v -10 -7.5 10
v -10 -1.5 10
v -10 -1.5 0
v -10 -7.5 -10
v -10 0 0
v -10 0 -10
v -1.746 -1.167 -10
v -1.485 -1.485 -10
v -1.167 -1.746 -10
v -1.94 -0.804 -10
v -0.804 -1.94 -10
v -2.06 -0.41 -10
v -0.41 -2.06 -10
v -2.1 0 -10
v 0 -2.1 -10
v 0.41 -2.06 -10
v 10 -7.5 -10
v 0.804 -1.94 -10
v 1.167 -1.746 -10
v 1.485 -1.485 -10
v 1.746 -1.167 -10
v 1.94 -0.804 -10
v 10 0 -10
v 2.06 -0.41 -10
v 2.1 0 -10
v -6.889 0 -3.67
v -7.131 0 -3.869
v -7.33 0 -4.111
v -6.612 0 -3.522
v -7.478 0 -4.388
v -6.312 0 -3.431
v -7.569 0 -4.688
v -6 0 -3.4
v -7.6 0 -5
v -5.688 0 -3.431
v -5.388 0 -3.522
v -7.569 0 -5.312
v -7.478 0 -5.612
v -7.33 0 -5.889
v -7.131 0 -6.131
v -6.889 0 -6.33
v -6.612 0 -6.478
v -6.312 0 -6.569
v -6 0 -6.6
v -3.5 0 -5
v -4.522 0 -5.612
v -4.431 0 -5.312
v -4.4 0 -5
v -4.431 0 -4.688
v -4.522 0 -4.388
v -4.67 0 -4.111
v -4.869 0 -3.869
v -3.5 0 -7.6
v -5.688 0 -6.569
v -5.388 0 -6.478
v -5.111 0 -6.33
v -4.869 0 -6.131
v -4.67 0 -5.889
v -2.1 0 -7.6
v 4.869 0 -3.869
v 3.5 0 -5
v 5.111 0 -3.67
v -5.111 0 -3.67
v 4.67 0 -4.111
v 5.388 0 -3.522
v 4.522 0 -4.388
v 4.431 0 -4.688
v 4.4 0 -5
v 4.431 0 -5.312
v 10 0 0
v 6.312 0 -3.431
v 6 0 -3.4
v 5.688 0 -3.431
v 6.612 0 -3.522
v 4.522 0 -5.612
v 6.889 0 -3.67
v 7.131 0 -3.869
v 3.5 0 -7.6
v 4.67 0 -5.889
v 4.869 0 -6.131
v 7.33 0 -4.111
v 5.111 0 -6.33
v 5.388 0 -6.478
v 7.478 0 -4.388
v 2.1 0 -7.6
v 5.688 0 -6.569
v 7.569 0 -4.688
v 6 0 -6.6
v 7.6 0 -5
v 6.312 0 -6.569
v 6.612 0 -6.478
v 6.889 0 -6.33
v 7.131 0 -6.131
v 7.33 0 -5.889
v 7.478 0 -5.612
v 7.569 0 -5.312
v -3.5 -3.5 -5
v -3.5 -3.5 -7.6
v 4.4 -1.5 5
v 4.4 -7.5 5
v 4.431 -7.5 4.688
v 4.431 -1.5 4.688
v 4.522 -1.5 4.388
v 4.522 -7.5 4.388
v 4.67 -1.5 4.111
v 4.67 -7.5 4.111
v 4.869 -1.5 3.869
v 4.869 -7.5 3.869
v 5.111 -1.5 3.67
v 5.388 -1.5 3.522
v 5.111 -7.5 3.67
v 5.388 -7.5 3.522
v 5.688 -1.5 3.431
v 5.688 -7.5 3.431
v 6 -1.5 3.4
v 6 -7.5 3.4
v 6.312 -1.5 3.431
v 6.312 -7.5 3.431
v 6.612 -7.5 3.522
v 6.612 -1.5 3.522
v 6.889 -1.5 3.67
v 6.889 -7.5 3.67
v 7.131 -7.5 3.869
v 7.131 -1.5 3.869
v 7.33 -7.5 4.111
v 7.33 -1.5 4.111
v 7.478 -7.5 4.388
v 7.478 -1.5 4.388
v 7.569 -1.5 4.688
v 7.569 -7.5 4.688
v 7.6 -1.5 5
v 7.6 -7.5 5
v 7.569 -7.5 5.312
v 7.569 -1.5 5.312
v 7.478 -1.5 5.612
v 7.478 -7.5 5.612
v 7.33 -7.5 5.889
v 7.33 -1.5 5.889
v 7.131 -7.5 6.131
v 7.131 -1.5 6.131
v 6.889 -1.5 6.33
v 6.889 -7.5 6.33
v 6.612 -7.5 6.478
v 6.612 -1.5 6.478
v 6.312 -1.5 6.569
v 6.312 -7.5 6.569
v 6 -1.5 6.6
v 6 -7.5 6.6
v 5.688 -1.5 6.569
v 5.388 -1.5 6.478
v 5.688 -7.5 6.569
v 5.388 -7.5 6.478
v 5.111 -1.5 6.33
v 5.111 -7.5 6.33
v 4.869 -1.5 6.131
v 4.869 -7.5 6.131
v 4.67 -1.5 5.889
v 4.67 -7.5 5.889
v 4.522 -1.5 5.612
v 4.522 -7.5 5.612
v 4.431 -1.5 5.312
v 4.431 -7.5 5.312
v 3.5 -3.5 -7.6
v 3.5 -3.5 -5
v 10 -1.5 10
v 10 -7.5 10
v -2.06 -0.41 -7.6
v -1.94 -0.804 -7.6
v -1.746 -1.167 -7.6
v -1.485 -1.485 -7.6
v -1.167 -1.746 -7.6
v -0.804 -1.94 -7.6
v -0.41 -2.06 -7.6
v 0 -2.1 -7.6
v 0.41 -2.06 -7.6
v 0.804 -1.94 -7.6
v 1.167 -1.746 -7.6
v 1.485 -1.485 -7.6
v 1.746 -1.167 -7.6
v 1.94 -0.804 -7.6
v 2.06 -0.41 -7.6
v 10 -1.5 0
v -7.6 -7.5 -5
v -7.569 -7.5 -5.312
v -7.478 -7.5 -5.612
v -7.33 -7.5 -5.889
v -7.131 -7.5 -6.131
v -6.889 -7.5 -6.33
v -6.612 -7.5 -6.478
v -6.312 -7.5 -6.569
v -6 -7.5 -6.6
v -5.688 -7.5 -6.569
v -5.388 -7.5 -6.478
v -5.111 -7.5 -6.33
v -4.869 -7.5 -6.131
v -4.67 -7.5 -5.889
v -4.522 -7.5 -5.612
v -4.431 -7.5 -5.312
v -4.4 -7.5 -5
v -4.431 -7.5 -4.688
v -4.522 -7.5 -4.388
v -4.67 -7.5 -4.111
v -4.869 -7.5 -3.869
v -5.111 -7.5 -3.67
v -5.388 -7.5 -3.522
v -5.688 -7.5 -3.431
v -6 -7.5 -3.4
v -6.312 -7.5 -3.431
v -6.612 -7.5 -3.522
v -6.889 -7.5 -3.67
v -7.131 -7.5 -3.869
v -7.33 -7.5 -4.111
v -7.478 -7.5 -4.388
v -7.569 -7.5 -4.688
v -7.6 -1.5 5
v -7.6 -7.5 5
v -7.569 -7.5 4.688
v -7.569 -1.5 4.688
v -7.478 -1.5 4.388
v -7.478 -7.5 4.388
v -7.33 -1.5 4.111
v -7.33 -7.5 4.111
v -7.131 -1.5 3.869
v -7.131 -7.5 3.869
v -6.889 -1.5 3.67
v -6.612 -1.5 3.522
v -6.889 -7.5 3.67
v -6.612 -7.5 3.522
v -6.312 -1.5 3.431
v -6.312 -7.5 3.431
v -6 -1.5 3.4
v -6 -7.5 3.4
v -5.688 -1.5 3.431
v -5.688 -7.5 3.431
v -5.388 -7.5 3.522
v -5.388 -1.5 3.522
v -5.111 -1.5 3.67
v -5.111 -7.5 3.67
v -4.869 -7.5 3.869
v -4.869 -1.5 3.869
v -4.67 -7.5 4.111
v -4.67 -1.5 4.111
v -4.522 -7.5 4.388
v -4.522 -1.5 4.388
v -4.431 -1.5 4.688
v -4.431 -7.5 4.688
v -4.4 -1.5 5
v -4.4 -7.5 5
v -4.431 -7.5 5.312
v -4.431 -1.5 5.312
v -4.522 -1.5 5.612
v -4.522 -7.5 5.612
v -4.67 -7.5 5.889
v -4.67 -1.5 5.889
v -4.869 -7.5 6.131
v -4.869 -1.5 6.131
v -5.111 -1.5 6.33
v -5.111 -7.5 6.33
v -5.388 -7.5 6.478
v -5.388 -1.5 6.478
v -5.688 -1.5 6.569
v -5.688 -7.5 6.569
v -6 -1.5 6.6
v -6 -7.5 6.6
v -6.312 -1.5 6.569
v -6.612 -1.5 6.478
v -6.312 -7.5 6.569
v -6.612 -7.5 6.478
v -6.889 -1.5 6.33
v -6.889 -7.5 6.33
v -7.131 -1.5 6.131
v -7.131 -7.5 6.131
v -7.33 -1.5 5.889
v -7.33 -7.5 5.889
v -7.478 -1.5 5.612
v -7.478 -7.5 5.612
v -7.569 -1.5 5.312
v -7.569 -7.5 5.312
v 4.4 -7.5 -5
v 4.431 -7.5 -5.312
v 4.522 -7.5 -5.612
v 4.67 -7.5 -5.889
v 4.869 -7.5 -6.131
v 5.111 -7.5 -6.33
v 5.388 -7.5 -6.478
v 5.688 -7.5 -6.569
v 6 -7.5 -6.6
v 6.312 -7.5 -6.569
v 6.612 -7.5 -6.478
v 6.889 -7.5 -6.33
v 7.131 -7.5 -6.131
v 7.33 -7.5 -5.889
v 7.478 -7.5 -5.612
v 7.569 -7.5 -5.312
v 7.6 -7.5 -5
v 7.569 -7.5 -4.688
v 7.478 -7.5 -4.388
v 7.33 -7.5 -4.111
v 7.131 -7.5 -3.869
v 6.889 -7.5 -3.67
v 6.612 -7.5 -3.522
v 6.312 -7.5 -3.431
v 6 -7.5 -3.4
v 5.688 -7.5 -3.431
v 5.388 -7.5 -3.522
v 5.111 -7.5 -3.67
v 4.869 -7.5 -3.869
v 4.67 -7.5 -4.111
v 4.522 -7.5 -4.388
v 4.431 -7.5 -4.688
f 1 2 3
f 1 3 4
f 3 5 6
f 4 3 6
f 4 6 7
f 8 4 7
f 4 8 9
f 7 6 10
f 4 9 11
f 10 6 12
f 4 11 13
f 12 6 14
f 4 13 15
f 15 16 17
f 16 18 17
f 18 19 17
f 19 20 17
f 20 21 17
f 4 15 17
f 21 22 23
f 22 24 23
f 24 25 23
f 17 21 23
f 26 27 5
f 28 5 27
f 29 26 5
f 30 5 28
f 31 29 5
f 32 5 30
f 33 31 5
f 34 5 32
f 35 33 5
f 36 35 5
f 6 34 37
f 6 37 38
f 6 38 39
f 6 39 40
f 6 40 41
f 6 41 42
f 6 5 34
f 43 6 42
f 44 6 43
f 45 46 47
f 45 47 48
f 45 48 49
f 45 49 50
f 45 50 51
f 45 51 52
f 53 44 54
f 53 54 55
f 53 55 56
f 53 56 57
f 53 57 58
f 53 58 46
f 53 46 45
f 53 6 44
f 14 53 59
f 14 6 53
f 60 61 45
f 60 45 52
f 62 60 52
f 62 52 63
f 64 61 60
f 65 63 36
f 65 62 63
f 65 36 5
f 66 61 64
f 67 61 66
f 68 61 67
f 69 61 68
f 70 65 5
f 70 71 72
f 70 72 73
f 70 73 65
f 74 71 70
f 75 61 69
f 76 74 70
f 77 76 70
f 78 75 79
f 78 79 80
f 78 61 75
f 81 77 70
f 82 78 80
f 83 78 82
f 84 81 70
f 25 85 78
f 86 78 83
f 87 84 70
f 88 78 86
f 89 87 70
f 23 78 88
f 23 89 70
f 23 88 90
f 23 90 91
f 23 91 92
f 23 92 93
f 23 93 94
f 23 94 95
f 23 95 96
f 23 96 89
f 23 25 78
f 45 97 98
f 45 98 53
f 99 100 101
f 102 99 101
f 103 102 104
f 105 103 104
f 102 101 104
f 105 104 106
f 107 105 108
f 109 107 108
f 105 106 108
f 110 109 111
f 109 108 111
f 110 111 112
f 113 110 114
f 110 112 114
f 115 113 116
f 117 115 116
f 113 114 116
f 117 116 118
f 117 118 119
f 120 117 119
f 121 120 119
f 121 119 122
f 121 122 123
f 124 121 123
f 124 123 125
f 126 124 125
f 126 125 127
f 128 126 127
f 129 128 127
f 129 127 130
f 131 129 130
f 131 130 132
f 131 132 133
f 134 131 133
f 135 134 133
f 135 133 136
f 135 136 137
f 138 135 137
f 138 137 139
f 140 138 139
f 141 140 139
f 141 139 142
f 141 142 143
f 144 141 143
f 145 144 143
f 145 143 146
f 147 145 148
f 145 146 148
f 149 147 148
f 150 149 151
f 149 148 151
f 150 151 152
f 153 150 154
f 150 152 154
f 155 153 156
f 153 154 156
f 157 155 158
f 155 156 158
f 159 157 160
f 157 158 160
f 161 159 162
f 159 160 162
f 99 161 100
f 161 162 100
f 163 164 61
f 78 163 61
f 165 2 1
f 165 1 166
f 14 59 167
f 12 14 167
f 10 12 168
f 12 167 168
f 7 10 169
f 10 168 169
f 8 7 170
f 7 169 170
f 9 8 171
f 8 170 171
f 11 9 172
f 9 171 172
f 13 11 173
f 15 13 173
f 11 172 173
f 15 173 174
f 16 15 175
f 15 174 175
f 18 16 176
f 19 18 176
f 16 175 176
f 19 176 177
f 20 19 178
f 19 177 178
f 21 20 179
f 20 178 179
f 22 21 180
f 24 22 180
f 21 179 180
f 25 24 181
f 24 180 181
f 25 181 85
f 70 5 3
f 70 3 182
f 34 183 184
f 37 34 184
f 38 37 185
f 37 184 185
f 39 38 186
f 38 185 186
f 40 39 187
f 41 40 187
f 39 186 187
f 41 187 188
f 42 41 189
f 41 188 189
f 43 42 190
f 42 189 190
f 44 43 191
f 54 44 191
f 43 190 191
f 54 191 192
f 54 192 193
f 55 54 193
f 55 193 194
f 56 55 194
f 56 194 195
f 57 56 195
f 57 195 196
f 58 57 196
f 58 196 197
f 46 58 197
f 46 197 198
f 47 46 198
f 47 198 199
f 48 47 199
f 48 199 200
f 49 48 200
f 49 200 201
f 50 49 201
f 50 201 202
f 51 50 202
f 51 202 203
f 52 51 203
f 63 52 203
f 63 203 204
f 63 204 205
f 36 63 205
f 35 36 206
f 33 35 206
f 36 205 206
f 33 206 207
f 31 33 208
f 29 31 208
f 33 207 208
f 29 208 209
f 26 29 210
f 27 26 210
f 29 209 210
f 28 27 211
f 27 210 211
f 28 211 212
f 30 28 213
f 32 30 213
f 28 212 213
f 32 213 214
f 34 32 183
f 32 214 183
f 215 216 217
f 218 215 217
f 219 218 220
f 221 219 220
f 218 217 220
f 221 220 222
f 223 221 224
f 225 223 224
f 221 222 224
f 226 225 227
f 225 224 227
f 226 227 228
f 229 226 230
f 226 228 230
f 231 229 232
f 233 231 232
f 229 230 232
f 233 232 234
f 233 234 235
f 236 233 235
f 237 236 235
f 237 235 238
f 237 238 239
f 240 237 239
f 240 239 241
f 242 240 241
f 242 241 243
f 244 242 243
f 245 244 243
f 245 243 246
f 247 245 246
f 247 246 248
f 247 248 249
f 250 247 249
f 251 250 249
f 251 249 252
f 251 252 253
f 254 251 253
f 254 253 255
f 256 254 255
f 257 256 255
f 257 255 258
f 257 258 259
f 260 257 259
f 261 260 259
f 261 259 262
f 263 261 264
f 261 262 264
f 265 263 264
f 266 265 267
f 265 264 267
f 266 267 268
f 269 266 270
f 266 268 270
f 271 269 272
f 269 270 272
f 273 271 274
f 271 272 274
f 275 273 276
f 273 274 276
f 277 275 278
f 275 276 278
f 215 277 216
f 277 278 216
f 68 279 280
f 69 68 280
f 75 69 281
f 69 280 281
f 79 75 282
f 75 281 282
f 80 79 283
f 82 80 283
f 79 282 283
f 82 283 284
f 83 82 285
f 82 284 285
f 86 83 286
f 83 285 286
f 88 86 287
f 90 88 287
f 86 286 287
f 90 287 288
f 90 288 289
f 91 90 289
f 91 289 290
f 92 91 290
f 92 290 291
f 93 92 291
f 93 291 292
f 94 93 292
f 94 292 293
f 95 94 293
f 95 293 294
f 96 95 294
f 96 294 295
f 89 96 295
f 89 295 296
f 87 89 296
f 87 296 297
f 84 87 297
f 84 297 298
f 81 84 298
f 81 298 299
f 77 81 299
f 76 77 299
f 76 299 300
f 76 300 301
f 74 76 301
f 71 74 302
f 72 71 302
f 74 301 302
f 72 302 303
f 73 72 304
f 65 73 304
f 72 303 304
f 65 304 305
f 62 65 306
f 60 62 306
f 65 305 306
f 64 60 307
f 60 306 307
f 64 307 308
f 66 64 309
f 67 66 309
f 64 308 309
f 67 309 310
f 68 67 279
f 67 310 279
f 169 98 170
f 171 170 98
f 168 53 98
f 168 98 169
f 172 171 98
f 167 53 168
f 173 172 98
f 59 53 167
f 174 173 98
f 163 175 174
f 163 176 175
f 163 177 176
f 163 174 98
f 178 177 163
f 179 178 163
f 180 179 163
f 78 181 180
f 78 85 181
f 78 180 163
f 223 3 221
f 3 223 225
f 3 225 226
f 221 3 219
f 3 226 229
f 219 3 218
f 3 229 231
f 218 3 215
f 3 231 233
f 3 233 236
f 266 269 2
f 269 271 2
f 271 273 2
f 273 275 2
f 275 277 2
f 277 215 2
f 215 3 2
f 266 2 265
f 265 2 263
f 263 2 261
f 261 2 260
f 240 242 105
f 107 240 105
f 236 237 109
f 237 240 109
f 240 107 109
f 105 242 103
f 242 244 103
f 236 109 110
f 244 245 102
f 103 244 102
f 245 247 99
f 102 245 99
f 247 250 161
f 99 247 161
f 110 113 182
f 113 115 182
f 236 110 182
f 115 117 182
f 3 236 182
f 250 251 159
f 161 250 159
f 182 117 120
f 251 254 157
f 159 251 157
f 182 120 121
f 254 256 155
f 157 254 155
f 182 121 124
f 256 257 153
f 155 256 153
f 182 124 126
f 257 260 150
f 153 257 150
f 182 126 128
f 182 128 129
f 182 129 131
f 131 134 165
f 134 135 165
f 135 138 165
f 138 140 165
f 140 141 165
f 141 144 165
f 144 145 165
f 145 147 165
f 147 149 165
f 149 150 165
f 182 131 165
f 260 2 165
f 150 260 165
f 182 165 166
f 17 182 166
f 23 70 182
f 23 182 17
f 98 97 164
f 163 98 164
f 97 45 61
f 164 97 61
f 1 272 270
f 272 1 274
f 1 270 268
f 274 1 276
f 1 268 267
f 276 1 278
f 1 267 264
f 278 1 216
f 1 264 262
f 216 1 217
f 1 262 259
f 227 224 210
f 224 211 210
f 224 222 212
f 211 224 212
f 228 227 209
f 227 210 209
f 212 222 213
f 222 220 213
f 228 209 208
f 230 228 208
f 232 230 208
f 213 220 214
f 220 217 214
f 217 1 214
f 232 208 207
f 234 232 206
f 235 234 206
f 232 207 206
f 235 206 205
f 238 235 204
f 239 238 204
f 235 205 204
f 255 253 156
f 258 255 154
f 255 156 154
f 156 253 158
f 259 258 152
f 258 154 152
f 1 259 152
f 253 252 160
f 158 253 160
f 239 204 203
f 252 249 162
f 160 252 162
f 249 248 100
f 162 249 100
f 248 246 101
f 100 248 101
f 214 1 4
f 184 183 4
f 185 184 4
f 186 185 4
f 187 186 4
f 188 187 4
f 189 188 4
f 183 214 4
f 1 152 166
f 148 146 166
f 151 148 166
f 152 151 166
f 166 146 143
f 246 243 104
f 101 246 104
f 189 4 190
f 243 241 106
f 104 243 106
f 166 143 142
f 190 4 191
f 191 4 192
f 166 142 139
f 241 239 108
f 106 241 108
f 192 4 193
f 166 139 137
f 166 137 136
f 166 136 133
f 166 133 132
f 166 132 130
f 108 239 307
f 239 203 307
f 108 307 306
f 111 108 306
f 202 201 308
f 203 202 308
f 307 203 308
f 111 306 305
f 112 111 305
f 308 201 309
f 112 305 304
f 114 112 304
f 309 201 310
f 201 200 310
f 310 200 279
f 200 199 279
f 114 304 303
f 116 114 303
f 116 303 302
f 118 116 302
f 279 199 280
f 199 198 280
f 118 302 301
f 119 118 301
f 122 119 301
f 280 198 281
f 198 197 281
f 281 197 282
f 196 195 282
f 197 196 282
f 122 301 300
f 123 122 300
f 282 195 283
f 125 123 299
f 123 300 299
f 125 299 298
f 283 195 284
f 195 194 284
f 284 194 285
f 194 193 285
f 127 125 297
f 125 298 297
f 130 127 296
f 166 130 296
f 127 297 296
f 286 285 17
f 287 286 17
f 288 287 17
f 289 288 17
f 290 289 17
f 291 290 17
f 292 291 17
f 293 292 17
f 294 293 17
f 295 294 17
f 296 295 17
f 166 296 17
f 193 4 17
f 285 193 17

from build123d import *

# Parameters (mm, degrees)
SKETCH2_W                  = 20
SKETCH2_H                  = 20
BOSS_EXTRUDE1_DEPTH        = 7.5
SKETCH3_W                  = 20
SKETCH3_H                  = 3
CUT_EXTRUDE1_DEPTH         = 10
SKETCH4_W                  = 7
SKETCH4_H                  = 7
CUT_EXTRUDE2_DEPTH         = 2.6
SKETCH5_R                  = 2.1
CUT_EXTRUDE3_DEPTH         = 20.52562419
F_3_1_3_1_DIAMETER_HOLE1_D = 3.2
F_3_1_3_1_DIAMETER_HOLE2_D = 3.2


with BuildPart() as part:
    # Sketch2 → Boss-Extrude1 (new body)
    with BuildSketch(Plane(origin=(0, 0, 0), x_dir=(1, 0, 0), z_dir=(0, 1, 0))):
        Rectangle(SKETCH2_W, SKETCH2_H)
    extrude(amount=-BOSS_EXTRUDE1_DEPTH)

    # Sketch3 → Cut-Extrude1 (cut)
    with BuildSketch(Plane.XY.offset(10)):
        Rectangle(SKETCH3_W, SKETCH3_H)
    extrude(amount=-CUT_EXTRUDE1_DEPTH, mode=Mode.SUBTRACT)

    # Sketch4 → Cut-Extrude2 (cut)
    with BuildSketch(Plane.XY.offset(-5)):
        Rectangle(SKETCH4_W, SKETCH4_H)
    extrude(amount=-CUT_EXTRUDE2_DEPTH, mode=Mode.SUBTRACT)

    # Sketch5 → Cut-Extrude3 (cut, through all)
    with BuildSketch(Plane.XY.offset(-5)):
        Circle(SKETCH5_R)
    extrude(amount=-CUT_EXTRUDE3_DEPTH, mode=Mode.SUBTRACT)

    # Ø3.1 (3.1) Diameter Hole1 (through all)
    with Locations(Plane(origin=(0, -1.5, 0), x_dir=(1, 0, 0), z_dir=(0, 1, 0))):
        with Locations((-6, -5), (6, -5)):
            Hole(F_3_1_3_1_DIAMETER_HOLE1_D / 2)

    # Ø3.1 (3.1) Diameter Hole2 (through all)
    with Locations(Plane(origin=(0, 0, 0), x_dir=(1, 0, 0), z_dir=(0, 1, 0))):
        with Locations((-6, 5), (6, 5)):
            Hole(F_3_1_3_1_DIAMETER_HOLE2_D / 2)


solid = part.part
